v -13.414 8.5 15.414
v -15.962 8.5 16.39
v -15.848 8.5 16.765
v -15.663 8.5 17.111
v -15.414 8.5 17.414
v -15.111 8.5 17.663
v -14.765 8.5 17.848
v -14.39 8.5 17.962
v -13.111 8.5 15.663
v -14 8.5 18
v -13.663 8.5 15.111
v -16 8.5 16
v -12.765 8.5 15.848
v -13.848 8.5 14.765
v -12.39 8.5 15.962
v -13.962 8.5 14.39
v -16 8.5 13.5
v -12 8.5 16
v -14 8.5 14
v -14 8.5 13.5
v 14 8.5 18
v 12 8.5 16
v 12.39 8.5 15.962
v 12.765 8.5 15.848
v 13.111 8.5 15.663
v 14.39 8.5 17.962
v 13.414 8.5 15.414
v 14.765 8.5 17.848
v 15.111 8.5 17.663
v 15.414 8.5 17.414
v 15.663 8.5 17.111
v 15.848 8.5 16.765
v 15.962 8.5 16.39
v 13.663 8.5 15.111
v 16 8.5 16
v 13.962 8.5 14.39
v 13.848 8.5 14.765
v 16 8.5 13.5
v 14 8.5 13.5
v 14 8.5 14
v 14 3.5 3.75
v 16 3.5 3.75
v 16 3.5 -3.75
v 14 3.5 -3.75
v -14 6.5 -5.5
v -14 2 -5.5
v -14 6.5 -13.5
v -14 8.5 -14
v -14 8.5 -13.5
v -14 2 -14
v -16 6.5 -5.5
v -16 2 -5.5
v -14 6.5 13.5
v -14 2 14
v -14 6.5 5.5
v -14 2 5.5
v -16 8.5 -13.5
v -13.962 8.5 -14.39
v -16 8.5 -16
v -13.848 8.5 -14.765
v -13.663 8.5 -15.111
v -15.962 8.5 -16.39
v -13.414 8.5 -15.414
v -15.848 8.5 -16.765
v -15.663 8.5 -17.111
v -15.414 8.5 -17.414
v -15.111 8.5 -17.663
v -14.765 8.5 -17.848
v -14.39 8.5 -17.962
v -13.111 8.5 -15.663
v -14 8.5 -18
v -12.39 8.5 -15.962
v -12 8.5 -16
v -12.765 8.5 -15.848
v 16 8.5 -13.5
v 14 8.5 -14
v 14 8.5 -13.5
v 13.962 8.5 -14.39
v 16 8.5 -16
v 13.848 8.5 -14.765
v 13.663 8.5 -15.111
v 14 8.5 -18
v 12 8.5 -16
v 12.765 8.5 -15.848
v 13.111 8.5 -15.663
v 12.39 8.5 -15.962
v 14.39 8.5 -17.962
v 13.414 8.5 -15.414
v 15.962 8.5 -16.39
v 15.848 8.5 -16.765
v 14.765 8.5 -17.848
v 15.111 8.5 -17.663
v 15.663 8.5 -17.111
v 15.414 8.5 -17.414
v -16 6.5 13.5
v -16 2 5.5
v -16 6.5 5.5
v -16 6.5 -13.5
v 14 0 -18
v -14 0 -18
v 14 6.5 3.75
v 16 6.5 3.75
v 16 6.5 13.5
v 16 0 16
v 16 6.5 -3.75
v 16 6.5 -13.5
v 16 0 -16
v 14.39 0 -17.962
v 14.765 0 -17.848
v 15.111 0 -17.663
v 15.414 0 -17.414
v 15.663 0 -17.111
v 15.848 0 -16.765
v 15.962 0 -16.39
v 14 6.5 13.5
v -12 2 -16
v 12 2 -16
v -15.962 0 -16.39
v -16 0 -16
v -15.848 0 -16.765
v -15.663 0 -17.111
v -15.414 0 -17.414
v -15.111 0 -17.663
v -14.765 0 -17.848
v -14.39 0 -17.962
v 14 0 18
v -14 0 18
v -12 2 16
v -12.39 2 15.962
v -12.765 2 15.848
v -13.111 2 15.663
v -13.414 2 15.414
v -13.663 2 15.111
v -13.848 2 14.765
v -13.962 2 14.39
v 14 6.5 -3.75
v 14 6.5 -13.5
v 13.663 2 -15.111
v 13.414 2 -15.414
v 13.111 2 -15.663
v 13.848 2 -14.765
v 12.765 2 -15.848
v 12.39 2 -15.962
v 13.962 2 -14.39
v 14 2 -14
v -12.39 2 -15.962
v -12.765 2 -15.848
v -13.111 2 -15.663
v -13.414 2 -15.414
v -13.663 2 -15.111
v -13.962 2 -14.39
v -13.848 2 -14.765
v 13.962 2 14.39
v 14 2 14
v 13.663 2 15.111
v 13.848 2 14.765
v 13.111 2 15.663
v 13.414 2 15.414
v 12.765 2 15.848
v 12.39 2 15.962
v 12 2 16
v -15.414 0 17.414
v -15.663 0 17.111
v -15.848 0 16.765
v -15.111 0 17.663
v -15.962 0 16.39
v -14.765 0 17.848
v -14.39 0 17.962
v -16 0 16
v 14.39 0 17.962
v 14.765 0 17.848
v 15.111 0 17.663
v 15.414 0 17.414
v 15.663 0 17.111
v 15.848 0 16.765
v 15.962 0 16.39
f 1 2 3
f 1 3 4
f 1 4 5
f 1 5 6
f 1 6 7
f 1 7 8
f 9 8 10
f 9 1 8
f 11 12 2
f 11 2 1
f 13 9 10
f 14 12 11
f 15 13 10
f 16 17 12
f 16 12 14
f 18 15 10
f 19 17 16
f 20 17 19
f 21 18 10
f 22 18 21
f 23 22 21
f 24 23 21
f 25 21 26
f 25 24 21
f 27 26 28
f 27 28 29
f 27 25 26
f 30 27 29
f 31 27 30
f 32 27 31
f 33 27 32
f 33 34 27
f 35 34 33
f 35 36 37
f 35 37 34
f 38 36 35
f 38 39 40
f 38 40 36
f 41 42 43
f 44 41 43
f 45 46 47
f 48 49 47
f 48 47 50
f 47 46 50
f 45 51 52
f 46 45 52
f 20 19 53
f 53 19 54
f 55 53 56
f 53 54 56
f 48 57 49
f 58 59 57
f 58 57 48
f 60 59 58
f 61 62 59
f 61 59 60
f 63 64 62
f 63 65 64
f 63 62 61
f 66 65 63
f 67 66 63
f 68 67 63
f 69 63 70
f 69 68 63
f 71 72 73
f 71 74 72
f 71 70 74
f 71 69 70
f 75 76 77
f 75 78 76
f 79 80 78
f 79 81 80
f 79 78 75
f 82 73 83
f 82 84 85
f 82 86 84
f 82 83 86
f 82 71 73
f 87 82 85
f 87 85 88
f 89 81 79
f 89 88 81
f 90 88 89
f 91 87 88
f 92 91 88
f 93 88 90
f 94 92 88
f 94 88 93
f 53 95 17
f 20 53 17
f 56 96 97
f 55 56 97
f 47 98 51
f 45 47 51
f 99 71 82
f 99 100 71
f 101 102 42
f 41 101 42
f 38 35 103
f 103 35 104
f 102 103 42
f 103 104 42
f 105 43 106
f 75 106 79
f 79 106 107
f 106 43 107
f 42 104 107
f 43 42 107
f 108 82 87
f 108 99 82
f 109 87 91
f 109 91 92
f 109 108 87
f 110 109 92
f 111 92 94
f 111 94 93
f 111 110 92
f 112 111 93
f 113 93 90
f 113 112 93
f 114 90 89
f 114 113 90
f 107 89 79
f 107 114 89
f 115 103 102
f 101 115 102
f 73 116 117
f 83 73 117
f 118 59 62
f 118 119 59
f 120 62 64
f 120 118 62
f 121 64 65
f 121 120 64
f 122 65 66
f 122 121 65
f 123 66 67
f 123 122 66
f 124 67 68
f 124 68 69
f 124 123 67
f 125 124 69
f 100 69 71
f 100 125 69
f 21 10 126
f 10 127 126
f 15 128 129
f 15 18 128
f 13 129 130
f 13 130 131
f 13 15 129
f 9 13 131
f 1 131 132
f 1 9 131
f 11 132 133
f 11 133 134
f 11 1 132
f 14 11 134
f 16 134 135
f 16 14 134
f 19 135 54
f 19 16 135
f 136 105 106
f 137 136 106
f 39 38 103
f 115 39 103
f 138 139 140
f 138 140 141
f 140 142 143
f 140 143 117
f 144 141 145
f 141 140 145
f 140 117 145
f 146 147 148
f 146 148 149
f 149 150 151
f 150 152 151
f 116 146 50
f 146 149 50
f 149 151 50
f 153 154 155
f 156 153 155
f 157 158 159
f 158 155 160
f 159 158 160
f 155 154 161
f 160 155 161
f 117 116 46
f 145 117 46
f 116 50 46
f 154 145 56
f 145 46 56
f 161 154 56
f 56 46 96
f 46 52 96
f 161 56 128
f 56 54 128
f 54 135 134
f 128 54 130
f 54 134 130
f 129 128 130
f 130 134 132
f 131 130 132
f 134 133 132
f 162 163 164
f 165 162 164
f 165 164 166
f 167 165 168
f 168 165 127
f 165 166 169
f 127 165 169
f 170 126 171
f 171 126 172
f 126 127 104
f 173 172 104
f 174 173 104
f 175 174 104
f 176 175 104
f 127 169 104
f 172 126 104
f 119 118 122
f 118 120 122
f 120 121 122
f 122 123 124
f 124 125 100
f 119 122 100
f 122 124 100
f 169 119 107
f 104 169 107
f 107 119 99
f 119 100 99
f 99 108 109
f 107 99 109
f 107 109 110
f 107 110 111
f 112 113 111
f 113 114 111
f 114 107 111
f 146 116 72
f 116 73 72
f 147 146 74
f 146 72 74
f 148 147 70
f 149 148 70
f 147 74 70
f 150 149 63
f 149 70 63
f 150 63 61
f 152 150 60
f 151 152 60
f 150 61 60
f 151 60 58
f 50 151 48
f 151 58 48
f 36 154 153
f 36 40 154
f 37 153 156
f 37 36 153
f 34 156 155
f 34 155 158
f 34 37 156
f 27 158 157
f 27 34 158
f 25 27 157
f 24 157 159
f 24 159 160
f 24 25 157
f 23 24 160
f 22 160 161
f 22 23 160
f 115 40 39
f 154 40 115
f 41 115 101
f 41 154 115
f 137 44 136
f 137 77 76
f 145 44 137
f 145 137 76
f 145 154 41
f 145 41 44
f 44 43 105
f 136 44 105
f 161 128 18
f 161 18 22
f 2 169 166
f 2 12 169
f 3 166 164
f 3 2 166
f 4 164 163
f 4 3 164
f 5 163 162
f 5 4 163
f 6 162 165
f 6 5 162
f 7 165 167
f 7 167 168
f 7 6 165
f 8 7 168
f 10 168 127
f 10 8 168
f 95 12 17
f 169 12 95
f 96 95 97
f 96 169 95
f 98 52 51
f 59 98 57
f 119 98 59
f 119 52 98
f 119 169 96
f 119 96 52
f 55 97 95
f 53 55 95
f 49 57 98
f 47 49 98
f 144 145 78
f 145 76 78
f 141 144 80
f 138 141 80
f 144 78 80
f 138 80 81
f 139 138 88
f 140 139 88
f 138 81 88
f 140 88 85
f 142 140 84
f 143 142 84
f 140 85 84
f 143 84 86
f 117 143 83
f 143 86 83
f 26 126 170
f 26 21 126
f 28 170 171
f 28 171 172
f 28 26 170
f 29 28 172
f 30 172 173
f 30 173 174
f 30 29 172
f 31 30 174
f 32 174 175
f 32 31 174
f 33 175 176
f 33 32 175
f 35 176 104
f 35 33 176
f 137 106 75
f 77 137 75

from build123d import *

# Parameters (mm, degrees)
SKETCH1_W           = 32
SKETCH1_H           = 36
BOSS_EXTRUDE1_DEPTH = 2
SKETCH2_W           = 32
SKETCH2_H           = 36
SKETCH2_W_2         = 28
SKETCH2_H_2         = 32
BOSS_EXTRUDE2_DEPTH = 6.5
CUT_EXTRUDE1_DEPTH  = 2
CUT_EXTRUDE2_DEPTH  = 2
FILLET1_R           = 2


with BuildPart() as part:
    # Sketch1 → Boss-Extrude1 (new body)
    with BuildSketch(Plane(origin=(0, 0, 0), x_dir=(1, 0, 0), z_dir=(0, 1, 0))):
        Rectangle(SKETCH1_W, SKETCH1_H)
    extrude(amount=BOSS_EXTRUDE1_DEPTH)

    # Sketch2 → Boss-Extrude2 (add)
    with BuildSketch(Plane(origin=(0, 2, 0), x_dir=(1, 0, 0), z_dir=(0, 1, 0))):
        Rectangle(SKETCH2_W, SKETCH2_H)
        Rectangle(SKETCH2_W_2, SKETCH2_H_2, mode=Mode.SUBTRACT)
    extrude(amount=BOSS_EXTRUDE2_DEPTH)

    # Sketch3 → Cut-Extrude1 (cut)
    with BuildSketch(Plane.ZY.offset(16)):
        Polygon((-13.5, 8.5), (-13.5, 6.5), (-5.5, 6.5), (-5.5, 2), (5.5, 2), (5.5, 6.5), (13.5, 6.5), (13.5, 8.5), align=None)
    extrude(amount=-CUT_EXTRUDE1_DEPTH, mode=Mode.SUBTRACT)

    # Sketch4 → Cut-Extrude2 (cut)
    with BuildSketch(Plane(origin=(16, 0, 0), x_dir=(0, 0, -1), z_dir=(1, 0, 0))):
        Polygon((-13.5, 8.5), (-13.5, 6.5), (-3.75, 6.5), (-3.75, 3.5), (3.75, 3.5), (3.75, 6.5), (13.5, 6.5), (13.5, 8.5), align=None)
    extrude(amount=-CUT_EXTRUDE2_DEPTH, mode=Mode.SUBTRACT)

    # Fillet1
    fillet1_edges = [part.edges().sort_by_distance(p)[0] for p in [
        (14, 5.25, -16),
        (14, 5.25, 16),
        (-14, 5.25, 16),
        (-14, 5.25, -16),
        (16, 4.25, 18),
        (-16, 4.25, 18),
        (-16, 4.25, -18),
        (16, 4.25, -18),
    ]]
    fillet(fillet1_edges, radius=FILLET1_R)


solid = part.part
